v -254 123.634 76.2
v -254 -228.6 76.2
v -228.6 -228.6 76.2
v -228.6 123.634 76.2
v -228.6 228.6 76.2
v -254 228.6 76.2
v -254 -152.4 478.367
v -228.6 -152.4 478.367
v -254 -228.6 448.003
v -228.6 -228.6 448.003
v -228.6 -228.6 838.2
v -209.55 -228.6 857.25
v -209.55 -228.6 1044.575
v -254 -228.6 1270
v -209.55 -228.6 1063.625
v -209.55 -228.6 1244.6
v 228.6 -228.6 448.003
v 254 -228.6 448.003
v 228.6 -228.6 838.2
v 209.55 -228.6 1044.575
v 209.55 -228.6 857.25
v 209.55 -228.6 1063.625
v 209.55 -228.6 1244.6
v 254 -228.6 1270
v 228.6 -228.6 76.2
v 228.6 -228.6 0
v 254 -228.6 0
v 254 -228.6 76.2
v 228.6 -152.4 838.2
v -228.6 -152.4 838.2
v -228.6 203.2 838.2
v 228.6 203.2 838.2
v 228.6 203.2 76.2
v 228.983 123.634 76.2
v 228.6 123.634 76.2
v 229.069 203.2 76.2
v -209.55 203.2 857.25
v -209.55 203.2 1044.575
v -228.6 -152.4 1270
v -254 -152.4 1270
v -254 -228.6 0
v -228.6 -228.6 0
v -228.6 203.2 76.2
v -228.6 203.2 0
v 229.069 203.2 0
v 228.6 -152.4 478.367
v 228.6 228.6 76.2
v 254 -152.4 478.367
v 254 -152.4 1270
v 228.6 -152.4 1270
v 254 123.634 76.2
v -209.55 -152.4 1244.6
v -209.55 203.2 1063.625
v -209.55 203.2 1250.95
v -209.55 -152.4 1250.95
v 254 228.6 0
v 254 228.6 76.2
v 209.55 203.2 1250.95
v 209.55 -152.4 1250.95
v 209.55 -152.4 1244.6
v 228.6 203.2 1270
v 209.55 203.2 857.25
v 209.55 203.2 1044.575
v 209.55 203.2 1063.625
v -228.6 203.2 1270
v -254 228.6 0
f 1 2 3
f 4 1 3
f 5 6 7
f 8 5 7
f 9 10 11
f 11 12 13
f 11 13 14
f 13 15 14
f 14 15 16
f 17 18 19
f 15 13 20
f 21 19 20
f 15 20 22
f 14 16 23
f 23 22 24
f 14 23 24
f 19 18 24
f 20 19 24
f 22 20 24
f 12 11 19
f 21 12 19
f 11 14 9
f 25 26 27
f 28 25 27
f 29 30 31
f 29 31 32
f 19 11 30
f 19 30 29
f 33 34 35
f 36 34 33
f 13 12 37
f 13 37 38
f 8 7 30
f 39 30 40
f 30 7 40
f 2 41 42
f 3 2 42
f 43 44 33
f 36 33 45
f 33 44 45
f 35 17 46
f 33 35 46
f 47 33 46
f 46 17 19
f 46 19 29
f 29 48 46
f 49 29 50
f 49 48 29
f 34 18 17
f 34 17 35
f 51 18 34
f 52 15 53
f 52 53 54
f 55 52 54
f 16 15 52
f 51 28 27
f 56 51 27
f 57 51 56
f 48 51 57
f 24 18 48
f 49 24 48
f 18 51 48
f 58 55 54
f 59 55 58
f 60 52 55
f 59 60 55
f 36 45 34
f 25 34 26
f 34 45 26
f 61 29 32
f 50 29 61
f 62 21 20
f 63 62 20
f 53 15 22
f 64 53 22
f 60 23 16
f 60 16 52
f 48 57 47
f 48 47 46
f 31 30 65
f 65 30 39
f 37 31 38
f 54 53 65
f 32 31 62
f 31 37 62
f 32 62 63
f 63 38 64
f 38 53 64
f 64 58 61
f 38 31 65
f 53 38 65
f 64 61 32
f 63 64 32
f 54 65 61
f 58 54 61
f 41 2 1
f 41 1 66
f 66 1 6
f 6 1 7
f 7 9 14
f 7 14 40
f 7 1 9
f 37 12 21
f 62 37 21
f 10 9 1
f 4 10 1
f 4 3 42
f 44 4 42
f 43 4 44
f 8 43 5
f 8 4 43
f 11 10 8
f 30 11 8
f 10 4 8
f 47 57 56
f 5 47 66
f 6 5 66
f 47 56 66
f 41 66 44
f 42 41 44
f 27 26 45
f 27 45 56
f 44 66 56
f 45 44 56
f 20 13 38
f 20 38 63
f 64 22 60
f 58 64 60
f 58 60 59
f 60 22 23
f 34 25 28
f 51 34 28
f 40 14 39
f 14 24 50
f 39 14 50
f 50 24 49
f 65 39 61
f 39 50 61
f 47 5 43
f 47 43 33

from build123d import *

# Parameters (mm, degrees)
F1_DEPTH  = 76.2
F5_DEPTH  = 25.4
F8_DEPTH  = 25.4
F10_W     = 457.2
F10_H     = 431.8
F10_W_2   = 419.1
F10_H_2   = 187.325
F11_DEPTH = 431.8
F12_W     = 76.2
F12_H     = 25.4
F13_DEPTH = 508


with BuildPart() as f1:
    # F0 (on Top) → F1 (new body)
    with BuildSketch(Plane.XY):
        Polygon((228.6, -228.6), (254, -228.6), (254, 228.6), (-254, 228.6), (-254, -228.6), (-228.6, -228.6), (-228.6, 203.2), (229.069446, 203.2), align=None)
    extrude(amount=F1_DEPTH)

    # F4 (on offset) → F5 (join)
    with BuildSketch(Plane.YZ.offset(254)):
        Polygon((123.634481, 76.2), (228.6, 76.2), (-152.4, 478.366667), (-152.4, 1244.6), (-228.6, 1244.6), (-228.6, 448.003064), align=None)
    extrude(amount=-F5_DEPTH)

    # F7 (on offset) → F8 (join)
    with BuildSketch(Plane.YZ.offset(-254)):
        Polygon((123.634481, 76.2), (228.6, 76.2), (-152.4, 478.366667), (-152.4, 1244.6), (-228.6, 1244.6), (-228.6, 448.003064), align=None)
    extrude(amount=F8_DEPTH)

    # F10 (on offset) → F11 (join)
    with BuildSketch(Plane.XZ.offset(228.6)):
        with Locations((0, 1054.1)):
            Rectangle(F10_W, F10_H)
        with Locations((0, 950.9125)):
            Rectangle(F10_W_2, F10_H_2, mode=Mode.SUBTRACT)
        with Locations((0, 1157.2875)):
            Rectangle(F10_W_2, F10_H_2, mode=Mode.SUBTRACT)
    extrude(amount=-F11_DEPTH)

    # F12 (on offset) → F13 (join)
    with BuildSketch(Plane.YZ.offset(254)):
        with Locations((-190.5, 1257.3)):
            Rectangle(F12_W, F12_H)
    extrude(amount=-F13_DEPTH)


solid = f1.part
